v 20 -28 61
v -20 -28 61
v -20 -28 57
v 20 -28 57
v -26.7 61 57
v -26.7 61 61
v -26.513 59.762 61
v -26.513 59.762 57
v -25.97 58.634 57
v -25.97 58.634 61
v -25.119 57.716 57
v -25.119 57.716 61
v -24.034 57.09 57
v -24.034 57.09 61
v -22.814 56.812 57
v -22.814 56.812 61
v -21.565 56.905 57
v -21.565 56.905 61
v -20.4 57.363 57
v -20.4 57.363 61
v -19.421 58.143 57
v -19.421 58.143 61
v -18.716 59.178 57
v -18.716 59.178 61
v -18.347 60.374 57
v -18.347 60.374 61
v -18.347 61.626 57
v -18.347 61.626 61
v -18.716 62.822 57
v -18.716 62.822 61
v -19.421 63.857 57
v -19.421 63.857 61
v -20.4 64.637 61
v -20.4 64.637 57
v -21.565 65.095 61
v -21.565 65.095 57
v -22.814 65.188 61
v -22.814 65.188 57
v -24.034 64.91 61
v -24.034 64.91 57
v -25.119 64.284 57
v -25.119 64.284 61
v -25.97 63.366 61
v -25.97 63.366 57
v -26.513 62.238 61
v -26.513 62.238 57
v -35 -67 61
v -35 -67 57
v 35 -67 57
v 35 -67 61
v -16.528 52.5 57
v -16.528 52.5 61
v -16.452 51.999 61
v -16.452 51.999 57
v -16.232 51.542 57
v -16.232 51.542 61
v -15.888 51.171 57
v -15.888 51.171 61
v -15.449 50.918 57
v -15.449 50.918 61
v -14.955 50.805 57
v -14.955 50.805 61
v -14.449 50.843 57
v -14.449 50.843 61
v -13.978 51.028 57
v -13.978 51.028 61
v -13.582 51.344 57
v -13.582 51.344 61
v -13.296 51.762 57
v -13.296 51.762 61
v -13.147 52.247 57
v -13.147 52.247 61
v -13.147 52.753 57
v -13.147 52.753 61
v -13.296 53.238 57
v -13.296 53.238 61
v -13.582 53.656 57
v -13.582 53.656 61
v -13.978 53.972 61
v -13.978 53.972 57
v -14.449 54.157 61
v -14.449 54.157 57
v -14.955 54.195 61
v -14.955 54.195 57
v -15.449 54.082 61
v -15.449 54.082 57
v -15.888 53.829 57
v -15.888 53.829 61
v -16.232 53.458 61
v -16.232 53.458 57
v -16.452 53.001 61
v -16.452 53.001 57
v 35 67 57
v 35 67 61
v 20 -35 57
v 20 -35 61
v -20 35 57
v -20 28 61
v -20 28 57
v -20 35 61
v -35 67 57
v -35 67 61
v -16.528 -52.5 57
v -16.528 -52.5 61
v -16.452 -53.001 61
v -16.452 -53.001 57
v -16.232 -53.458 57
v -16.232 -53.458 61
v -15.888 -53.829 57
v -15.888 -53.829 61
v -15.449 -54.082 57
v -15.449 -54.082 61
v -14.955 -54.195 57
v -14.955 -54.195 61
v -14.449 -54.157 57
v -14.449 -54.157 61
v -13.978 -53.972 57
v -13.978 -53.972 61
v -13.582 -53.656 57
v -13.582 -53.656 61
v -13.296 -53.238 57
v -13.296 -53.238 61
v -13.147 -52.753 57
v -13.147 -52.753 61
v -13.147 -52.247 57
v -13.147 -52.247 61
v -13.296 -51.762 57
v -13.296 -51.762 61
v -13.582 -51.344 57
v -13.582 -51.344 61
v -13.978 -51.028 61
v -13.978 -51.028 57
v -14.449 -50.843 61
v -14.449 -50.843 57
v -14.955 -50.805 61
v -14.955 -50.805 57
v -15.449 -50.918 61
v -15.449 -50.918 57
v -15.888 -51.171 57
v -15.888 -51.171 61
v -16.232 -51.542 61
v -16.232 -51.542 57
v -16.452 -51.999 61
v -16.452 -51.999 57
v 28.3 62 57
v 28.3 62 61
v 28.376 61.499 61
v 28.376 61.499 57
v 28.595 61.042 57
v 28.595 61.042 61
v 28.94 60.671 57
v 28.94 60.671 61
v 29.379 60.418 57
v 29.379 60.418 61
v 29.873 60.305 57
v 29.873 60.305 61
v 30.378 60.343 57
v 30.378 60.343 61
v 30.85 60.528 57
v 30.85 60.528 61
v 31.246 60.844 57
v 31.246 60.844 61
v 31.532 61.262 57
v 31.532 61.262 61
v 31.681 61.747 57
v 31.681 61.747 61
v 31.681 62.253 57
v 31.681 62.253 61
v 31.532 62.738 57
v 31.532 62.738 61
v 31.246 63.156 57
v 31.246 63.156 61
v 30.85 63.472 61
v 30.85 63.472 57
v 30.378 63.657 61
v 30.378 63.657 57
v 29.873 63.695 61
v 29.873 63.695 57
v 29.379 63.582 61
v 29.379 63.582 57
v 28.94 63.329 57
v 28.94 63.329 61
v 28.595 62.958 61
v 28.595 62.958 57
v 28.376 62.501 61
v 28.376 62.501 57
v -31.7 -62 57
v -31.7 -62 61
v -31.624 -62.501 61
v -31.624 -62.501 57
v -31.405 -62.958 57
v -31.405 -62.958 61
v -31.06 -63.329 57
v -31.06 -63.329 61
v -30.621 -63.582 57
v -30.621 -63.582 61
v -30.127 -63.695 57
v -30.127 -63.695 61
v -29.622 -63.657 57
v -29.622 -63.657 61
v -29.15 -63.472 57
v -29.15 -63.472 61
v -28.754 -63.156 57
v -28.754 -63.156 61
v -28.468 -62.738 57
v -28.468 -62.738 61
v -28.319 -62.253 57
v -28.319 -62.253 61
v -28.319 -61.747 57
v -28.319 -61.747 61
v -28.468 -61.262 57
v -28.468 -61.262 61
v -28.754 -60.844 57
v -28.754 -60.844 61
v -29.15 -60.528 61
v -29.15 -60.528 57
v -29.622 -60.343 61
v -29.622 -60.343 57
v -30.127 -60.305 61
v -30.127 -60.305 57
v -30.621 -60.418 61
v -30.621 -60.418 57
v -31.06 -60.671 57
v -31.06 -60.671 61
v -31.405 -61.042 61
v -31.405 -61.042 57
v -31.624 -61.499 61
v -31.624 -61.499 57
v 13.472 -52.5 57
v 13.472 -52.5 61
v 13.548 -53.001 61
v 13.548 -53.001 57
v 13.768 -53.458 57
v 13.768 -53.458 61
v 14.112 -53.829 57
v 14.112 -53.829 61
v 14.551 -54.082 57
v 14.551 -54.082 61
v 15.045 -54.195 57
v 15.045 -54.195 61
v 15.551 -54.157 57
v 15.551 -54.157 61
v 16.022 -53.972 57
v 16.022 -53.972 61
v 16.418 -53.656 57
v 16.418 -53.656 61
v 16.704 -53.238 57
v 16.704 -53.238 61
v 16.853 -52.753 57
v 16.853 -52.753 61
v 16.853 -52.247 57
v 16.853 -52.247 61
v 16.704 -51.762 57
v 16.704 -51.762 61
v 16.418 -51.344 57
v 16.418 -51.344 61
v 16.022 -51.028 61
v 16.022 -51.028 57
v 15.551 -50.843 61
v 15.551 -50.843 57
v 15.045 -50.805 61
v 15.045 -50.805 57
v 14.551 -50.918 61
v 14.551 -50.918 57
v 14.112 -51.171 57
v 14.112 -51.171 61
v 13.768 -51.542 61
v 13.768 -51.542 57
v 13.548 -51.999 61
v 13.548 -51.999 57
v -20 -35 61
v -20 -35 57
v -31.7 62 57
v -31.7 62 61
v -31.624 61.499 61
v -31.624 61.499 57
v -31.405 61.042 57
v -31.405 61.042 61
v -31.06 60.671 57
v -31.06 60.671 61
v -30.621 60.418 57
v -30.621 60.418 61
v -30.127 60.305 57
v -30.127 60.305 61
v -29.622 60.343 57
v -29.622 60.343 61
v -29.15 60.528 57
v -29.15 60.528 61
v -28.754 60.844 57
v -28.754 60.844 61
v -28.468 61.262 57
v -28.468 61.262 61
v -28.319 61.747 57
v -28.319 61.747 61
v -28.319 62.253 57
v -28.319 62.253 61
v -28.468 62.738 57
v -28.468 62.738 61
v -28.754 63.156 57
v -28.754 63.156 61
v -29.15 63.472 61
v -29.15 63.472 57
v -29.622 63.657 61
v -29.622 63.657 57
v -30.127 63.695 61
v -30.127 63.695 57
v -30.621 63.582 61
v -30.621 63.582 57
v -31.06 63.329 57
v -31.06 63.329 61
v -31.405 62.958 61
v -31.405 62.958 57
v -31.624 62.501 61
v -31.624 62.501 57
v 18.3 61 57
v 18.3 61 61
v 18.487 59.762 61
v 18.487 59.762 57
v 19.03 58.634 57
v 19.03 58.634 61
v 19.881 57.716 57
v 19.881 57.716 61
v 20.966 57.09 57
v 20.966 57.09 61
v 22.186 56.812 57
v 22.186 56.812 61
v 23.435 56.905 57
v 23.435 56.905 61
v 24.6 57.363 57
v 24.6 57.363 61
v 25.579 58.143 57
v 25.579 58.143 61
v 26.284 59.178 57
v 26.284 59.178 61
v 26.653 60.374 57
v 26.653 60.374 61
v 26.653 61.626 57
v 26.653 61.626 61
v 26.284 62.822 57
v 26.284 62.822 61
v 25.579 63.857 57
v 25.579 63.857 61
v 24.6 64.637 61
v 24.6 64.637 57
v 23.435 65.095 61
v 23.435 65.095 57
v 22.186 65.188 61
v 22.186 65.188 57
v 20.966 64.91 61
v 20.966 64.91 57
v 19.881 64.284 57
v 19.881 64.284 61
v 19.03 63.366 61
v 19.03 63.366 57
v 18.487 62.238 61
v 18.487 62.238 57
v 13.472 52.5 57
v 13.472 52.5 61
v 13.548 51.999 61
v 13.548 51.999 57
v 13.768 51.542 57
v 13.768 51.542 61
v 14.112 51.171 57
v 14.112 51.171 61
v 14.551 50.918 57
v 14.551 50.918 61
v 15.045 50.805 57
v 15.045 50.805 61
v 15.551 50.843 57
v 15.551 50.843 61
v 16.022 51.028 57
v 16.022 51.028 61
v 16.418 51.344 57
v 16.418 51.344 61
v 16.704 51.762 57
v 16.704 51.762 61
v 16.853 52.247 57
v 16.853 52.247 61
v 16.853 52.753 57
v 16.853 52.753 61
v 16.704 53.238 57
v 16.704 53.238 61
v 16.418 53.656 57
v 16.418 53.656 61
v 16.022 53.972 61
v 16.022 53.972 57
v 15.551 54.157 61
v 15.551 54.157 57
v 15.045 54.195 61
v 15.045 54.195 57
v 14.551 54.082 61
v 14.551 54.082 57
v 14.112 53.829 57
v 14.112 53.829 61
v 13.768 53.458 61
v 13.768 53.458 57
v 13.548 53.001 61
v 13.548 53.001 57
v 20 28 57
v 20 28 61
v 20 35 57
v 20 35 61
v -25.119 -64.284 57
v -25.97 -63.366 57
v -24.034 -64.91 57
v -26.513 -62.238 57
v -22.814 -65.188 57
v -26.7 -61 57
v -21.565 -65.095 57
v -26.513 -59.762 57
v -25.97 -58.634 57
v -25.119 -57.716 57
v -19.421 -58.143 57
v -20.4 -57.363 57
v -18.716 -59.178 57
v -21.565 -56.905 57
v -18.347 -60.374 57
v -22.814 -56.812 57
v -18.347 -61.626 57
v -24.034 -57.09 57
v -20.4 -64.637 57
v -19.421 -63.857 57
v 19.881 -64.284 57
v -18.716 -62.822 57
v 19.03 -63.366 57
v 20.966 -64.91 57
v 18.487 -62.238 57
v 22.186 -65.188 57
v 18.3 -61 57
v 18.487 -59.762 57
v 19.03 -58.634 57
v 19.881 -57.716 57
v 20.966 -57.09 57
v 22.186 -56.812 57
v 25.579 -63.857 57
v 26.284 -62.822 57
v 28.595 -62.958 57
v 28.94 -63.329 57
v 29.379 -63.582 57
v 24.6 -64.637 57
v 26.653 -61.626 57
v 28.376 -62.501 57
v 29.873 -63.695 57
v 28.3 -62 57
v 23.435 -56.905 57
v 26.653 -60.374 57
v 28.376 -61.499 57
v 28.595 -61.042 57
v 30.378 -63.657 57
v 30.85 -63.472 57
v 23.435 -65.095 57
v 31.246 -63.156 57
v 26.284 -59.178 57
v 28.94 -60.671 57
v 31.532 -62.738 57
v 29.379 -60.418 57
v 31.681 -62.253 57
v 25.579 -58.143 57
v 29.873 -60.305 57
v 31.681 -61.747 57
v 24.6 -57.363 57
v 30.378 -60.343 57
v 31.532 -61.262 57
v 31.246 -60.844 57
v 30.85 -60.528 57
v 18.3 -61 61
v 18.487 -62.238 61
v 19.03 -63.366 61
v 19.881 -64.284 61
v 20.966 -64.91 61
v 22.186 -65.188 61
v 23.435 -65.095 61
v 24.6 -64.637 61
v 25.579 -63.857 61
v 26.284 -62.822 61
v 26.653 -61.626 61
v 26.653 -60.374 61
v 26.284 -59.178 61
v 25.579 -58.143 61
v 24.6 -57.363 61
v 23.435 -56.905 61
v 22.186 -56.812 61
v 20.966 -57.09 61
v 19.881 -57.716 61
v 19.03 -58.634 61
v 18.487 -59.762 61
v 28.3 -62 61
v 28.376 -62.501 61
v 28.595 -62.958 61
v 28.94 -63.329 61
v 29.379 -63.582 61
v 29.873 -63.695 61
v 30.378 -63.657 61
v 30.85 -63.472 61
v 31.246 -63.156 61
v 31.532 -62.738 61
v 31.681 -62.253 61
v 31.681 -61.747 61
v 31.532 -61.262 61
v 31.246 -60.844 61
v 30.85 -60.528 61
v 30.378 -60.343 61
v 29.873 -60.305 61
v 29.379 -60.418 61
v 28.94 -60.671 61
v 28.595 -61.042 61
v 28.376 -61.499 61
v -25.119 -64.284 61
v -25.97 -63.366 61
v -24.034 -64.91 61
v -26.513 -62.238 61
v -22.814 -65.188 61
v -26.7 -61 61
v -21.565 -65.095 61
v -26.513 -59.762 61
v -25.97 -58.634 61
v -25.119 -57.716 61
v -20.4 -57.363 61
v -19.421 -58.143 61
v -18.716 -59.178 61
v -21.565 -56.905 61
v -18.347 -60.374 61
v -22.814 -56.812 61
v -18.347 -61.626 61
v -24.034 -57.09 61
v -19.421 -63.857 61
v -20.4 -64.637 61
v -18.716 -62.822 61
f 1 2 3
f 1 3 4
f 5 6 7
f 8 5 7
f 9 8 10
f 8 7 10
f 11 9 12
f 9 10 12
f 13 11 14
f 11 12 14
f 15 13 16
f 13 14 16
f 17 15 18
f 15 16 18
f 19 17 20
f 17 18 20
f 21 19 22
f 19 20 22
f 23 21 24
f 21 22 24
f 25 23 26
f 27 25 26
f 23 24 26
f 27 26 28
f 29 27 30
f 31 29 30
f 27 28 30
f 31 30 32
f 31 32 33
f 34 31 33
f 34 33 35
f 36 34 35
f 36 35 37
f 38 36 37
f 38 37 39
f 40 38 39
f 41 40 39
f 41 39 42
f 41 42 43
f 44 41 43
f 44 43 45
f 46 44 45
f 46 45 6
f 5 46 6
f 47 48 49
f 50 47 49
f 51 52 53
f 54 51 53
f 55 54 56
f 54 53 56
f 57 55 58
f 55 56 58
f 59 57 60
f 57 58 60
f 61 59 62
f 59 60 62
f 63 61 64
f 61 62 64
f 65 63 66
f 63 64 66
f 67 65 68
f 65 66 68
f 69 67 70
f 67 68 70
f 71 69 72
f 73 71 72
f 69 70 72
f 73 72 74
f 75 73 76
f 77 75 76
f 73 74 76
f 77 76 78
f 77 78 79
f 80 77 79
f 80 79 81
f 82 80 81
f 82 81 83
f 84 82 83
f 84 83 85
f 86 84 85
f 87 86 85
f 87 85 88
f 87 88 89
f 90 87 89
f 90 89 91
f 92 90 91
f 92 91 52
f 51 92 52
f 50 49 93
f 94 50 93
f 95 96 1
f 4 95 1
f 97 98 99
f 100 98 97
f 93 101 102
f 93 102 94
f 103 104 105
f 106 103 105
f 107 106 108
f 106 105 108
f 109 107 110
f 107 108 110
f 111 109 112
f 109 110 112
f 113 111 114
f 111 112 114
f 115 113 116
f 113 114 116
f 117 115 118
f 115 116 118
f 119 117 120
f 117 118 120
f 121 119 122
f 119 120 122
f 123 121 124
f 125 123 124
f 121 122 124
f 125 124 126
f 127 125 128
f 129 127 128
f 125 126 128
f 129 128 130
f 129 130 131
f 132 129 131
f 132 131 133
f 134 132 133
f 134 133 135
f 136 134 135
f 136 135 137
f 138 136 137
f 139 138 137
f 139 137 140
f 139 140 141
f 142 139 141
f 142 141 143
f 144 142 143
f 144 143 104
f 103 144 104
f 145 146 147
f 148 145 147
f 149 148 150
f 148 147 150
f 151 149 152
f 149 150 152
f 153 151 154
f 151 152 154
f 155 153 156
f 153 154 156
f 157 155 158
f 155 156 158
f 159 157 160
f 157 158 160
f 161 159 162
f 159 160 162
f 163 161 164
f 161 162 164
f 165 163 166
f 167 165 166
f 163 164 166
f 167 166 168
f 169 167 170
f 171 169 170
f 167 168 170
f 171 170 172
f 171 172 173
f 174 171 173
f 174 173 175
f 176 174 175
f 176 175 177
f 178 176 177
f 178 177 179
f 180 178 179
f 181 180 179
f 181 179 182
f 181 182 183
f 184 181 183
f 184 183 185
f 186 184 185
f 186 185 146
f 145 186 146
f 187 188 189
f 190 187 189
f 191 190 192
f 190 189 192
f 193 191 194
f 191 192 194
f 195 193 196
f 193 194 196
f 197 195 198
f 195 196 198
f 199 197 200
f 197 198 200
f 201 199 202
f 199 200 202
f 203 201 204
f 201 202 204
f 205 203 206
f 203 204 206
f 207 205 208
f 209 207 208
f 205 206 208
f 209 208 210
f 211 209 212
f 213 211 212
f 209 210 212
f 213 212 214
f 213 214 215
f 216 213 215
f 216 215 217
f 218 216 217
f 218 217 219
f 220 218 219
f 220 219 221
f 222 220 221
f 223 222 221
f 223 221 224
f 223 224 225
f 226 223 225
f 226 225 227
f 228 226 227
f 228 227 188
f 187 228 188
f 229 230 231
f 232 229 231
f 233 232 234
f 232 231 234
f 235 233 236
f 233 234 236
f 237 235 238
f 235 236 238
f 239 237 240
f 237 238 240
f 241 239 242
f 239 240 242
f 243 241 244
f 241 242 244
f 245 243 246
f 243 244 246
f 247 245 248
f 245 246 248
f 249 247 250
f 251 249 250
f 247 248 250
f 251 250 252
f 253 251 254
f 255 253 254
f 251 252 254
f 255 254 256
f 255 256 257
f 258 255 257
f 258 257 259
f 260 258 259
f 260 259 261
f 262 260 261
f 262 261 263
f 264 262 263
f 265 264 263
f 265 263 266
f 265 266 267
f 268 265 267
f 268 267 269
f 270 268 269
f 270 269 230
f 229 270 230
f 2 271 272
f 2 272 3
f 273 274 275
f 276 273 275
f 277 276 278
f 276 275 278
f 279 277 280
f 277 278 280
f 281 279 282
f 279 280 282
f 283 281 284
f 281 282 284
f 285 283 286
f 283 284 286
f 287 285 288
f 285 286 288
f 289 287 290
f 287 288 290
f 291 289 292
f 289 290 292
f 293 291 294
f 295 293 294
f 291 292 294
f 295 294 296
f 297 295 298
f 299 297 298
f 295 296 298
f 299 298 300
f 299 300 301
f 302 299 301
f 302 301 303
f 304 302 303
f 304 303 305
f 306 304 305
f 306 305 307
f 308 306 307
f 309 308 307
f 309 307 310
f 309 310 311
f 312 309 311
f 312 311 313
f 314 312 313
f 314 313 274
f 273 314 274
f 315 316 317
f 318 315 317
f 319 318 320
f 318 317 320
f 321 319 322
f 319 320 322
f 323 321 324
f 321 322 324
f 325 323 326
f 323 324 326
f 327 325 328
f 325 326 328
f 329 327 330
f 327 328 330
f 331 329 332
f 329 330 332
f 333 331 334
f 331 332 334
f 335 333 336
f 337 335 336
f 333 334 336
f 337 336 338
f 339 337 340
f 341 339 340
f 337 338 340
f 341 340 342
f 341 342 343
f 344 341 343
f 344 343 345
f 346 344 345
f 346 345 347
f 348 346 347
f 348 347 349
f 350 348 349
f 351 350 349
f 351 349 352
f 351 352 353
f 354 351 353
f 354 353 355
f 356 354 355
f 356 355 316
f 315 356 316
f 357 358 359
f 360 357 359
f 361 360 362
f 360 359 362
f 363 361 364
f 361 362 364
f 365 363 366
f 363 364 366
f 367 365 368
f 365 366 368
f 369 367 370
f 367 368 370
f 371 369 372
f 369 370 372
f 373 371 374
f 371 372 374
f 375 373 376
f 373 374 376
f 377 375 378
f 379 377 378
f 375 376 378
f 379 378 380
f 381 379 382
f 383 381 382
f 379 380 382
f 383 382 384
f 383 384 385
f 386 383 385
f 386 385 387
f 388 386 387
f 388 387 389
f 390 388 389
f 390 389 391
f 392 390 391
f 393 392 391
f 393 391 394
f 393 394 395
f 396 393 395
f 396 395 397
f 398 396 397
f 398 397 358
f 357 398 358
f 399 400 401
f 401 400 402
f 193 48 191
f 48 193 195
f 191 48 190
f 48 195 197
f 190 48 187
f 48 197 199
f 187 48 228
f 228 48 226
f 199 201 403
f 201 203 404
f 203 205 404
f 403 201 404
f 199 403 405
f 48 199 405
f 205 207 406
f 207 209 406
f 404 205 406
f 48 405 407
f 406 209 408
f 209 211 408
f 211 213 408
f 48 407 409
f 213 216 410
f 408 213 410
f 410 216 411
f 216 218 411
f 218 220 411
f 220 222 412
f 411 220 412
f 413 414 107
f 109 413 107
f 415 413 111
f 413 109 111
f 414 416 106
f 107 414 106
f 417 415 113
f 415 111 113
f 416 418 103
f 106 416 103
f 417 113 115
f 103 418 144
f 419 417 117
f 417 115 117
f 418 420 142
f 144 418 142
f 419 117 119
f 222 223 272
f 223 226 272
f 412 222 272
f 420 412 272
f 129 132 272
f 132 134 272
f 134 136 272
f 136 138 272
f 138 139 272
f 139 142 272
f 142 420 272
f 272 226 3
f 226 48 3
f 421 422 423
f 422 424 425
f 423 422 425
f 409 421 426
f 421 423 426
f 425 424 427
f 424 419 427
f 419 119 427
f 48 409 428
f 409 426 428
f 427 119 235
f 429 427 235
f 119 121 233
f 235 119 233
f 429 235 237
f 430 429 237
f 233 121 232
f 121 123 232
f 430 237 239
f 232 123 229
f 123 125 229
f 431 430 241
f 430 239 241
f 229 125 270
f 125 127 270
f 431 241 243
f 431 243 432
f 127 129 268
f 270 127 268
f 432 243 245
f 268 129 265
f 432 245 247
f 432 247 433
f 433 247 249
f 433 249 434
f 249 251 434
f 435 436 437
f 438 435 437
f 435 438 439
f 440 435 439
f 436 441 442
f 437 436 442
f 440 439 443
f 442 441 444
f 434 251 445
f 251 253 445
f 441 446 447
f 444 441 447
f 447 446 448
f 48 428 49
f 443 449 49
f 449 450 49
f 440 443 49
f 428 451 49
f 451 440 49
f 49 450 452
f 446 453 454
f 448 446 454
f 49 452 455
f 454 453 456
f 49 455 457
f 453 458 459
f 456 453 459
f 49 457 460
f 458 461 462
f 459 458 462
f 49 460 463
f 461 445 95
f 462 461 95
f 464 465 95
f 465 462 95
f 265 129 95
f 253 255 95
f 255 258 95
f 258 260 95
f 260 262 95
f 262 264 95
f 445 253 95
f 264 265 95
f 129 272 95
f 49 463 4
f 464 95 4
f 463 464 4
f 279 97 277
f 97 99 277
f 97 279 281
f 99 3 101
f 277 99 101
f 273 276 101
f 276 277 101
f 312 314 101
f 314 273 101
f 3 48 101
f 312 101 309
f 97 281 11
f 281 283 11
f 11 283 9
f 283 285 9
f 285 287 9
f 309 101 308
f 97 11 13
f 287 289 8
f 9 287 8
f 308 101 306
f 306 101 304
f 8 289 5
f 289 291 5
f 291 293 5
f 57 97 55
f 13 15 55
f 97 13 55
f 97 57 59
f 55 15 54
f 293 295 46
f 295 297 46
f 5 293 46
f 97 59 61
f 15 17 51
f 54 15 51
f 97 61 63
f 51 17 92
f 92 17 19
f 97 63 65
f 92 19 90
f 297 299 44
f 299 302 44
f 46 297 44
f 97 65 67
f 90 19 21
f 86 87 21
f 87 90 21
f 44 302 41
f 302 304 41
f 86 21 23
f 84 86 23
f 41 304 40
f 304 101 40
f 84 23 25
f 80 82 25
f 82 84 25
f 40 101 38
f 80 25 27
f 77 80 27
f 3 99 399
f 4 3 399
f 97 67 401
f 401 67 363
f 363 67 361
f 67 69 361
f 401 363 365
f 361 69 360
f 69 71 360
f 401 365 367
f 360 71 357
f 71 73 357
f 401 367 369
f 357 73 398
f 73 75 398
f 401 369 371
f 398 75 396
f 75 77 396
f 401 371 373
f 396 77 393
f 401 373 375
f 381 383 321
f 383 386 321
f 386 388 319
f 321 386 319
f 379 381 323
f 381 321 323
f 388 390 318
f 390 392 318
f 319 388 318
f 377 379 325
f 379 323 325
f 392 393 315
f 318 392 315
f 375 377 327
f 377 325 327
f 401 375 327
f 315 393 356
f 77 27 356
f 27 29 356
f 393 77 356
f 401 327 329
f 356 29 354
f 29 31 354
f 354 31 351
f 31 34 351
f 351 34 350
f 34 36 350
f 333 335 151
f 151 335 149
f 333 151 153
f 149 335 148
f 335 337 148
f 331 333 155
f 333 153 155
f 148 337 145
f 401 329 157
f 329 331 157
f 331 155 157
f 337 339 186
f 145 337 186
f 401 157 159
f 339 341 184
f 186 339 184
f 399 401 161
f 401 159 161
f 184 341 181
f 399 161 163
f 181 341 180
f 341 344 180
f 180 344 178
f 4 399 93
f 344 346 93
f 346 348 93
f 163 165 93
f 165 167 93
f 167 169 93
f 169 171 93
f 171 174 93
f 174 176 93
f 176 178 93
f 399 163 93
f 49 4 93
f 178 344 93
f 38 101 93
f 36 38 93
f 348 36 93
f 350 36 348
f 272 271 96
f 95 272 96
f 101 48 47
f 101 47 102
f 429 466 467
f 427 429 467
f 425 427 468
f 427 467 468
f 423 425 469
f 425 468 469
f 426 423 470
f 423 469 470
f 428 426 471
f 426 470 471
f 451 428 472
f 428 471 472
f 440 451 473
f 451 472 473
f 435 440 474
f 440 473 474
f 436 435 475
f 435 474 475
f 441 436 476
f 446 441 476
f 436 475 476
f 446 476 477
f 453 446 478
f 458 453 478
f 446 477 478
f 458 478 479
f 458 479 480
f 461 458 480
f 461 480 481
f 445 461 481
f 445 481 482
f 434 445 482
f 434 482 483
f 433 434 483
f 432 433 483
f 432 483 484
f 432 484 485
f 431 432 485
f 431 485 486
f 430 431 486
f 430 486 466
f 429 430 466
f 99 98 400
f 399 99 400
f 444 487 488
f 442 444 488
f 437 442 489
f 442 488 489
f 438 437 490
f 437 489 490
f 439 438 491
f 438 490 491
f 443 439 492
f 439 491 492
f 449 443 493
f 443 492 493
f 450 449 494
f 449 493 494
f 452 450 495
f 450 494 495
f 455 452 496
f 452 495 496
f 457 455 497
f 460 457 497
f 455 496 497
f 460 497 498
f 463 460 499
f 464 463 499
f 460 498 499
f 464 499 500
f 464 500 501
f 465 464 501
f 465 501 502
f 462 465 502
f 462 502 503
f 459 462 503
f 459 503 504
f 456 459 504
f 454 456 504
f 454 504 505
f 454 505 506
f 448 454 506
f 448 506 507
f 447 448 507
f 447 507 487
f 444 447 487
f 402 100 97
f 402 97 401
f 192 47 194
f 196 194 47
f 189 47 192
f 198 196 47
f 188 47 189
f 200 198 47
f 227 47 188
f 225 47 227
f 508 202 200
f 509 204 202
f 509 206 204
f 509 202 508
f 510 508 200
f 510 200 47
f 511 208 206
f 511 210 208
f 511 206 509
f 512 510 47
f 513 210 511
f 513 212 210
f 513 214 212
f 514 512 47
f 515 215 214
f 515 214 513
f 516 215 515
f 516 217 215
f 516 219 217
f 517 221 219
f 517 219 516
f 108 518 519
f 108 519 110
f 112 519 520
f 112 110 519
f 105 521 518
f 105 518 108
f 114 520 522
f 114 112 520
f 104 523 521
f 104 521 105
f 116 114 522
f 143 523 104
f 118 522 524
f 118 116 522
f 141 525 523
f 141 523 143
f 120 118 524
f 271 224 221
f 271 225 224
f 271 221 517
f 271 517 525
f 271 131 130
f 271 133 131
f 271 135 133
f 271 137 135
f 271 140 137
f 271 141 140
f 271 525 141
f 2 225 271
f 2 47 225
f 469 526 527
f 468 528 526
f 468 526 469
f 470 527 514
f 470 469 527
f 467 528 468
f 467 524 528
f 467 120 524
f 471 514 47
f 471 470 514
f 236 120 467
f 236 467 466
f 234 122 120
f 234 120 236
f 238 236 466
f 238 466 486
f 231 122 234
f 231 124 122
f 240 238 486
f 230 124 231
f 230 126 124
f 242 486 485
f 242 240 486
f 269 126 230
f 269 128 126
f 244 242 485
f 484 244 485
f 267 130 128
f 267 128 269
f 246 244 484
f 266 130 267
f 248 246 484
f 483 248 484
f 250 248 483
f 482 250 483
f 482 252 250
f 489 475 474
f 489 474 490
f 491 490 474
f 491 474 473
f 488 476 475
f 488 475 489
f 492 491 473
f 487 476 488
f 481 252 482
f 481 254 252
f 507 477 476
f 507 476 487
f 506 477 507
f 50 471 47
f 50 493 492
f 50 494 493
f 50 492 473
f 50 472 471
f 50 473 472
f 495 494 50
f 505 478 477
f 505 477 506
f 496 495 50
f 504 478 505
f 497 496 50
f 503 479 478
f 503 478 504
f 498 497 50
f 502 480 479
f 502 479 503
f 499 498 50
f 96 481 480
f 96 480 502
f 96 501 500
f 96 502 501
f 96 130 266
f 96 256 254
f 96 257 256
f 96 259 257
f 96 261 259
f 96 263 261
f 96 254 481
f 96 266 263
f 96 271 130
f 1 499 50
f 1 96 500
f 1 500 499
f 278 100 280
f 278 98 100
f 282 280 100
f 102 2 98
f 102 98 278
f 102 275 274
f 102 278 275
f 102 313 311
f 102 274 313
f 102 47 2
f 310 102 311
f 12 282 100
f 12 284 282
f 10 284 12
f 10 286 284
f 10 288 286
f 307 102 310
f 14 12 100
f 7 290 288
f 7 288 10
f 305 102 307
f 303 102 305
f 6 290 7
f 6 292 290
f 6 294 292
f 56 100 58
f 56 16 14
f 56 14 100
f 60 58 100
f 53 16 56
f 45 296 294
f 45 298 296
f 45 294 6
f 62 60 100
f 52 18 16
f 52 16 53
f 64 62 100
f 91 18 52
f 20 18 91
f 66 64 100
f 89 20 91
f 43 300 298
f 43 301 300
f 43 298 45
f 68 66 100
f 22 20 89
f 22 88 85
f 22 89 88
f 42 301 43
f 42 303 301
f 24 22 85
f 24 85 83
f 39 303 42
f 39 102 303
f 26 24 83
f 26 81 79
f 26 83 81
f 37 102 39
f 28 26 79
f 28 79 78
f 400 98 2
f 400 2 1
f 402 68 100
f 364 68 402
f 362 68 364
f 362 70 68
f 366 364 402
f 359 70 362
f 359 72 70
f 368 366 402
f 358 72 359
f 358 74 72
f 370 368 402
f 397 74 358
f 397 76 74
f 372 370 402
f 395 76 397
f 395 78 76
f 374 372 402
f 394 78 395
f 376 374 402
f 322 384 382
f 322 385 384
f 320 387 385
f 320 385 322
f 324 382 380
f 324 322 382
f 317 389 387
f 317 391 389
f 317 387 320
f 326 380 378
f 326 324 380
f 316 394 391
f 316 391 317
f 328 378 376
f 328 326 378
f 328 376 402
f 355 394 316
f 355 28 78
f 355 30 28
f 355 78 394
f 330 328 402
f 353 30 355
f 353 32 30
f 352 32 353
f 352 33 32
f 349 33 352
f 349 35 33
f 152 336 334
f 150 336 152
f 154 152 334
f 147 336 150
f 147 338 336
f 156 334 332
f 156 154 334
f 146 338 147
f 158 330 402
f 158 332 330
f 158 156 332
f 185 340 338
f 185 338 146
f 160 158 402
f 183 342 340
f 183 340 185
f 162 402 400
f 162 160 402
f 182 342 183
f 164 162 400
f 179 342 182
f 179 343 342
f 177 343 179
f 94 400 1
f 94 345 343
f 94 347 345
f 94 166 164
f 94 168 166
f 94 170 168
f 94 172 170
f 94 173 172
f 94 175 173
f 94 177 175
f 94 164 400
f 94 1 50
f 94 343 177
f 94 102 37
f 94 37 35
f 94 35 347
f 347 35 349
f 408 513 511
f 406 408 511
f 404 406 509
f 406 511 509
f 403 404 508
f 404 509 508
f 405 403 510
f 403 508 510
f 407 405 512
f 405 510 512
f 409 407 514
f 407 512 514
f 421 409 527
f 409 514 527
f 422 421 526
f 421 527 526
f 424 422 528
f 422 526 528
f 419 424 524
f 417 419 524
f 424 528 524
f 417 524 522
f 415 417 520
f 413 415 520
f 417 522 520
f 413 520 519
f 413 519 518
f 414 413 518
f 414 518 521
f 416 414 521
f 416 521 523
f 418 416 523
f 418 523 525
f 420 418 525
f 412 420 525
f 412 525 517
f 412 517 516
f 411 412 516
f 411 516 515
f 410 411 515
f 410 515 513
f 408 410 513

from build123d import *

# Parameters (mm, degrees)
CONTROLLER_REMOVABLE_CENTRAL_TRAY_START   = 57
SKETCH_1_W                                = 70
SKETCH_1_H                                = 134
CONTROLLER_REMOVABLE_CENTRAL_TRAY_DEPTH   = 4
CONTROLLER_FLANGE_AND_SERVICE_SLOTS_START = 62
SKETCH_2_R                                = 1.7
SKETCH_2_W                                = 40
SKETCH_2_H                                = 7
CONTROLLER_FLANGE_AND_SERVICE_SLOTS_DEPTH = 6
DRIVER_POST_AND_FASTENER_CLEARANCE_START  = 62
SKETCH_3_R                                = 4.2
DRIVER_POST_AND_FASTENER_CLEARANCE_DEPTH  = 6


with BuildPart() as part:
    # 草图1 → Controller_removable_central_tray (new body)
    with BuildSketch(Plane.XY.offset(CONTROLLER_REMOVABLE_CENTRAL_TRAY_START)):
        Rectangle(SKETCH_1_W, SKETCH_1_H)
    extrude(amount=CONTROLLER_REMOVABLE_CENTRAL_TRAY_DEPTH)

    # 草图2 → Controller_flange_and_service_slots (cut)
    with BuildSketch(Plane.XY.offset(CONTROLLER_FLANGE_AND_SERVICE_SLOTS_START)):
        with Locations(Location((-30, -62, 0), (0, 0, 180))):
            Circle(SKETCH_2_R)
        with Locations(Location((-30, 62, 0), (0, 0, 180))):
            Circle(SKETCH_2_R)
        with Locations(Location((30, -62, 0), (0, 0, 180))):
            Circle(SKETCH_2_R)
        with Locations(Location((30, 62, 0), (0, 0, 180))):
            Circle(SKETCH_2_R)
        with Locations(Location((15.172281679, -52.5, 0), (0, 0, 180))):
            Circle(SKETCH_2_R)
        with Locations(Location((15.172281679, 52.5, 0), (0, 0, 180))):
            Circle(SKETCH_2_R)
        with Locations(Location((-14.827718321, -52.5, 0), (0, 0, 180))):
            Circle(SKETCH_2_R)
        with Locations(Location((-14.827718321, 52.5, 0), (0, 0, 180))):
            Circle(SKETCH_2_R)
        with Locations((0, -31.5)):
            Rectangle(SKETCH_2_W, SKETCH_2_H)
        with Locations((0, 31.5)):
            Rectangle(SKETCH_2_W, SKETCH_2_H)
    extrude(amount=-CONTROLLER_FLANGE_AND_SERVICE_SLOTS_DEPTH, mode=Mode.SUBTRACT)

    # 草图3 → Driver_post_and_fastener_clearance (cut)
    with BuildSketch(Plane.XY.offset(DRIVER_POST_AND_FASTENER_CLEARANCE_START)):
        with Locations(Location((-22.5, -61, 0), (0, 0, 180))):
            Circle(SKETCH_3_R)
        with Locations(Location((-22.5, 61, 0), (0, 0, 180))):
            Circle(SKETCH_3_R)
        with Locations(Location((22.5, -61, 0), (0, 0, 180))):
            Circle(SKETCH_3_R)
        with Locations(Location((22.5, 61, 0), (0, 0, 180))):
            Circle(SKETCH_3_R)
    extrude(amount=-DRIVER_POST_AND_FASTENER_CLEARANCE_DEPTH, mode=Mode.SUBTRACT)


solid = part.part
